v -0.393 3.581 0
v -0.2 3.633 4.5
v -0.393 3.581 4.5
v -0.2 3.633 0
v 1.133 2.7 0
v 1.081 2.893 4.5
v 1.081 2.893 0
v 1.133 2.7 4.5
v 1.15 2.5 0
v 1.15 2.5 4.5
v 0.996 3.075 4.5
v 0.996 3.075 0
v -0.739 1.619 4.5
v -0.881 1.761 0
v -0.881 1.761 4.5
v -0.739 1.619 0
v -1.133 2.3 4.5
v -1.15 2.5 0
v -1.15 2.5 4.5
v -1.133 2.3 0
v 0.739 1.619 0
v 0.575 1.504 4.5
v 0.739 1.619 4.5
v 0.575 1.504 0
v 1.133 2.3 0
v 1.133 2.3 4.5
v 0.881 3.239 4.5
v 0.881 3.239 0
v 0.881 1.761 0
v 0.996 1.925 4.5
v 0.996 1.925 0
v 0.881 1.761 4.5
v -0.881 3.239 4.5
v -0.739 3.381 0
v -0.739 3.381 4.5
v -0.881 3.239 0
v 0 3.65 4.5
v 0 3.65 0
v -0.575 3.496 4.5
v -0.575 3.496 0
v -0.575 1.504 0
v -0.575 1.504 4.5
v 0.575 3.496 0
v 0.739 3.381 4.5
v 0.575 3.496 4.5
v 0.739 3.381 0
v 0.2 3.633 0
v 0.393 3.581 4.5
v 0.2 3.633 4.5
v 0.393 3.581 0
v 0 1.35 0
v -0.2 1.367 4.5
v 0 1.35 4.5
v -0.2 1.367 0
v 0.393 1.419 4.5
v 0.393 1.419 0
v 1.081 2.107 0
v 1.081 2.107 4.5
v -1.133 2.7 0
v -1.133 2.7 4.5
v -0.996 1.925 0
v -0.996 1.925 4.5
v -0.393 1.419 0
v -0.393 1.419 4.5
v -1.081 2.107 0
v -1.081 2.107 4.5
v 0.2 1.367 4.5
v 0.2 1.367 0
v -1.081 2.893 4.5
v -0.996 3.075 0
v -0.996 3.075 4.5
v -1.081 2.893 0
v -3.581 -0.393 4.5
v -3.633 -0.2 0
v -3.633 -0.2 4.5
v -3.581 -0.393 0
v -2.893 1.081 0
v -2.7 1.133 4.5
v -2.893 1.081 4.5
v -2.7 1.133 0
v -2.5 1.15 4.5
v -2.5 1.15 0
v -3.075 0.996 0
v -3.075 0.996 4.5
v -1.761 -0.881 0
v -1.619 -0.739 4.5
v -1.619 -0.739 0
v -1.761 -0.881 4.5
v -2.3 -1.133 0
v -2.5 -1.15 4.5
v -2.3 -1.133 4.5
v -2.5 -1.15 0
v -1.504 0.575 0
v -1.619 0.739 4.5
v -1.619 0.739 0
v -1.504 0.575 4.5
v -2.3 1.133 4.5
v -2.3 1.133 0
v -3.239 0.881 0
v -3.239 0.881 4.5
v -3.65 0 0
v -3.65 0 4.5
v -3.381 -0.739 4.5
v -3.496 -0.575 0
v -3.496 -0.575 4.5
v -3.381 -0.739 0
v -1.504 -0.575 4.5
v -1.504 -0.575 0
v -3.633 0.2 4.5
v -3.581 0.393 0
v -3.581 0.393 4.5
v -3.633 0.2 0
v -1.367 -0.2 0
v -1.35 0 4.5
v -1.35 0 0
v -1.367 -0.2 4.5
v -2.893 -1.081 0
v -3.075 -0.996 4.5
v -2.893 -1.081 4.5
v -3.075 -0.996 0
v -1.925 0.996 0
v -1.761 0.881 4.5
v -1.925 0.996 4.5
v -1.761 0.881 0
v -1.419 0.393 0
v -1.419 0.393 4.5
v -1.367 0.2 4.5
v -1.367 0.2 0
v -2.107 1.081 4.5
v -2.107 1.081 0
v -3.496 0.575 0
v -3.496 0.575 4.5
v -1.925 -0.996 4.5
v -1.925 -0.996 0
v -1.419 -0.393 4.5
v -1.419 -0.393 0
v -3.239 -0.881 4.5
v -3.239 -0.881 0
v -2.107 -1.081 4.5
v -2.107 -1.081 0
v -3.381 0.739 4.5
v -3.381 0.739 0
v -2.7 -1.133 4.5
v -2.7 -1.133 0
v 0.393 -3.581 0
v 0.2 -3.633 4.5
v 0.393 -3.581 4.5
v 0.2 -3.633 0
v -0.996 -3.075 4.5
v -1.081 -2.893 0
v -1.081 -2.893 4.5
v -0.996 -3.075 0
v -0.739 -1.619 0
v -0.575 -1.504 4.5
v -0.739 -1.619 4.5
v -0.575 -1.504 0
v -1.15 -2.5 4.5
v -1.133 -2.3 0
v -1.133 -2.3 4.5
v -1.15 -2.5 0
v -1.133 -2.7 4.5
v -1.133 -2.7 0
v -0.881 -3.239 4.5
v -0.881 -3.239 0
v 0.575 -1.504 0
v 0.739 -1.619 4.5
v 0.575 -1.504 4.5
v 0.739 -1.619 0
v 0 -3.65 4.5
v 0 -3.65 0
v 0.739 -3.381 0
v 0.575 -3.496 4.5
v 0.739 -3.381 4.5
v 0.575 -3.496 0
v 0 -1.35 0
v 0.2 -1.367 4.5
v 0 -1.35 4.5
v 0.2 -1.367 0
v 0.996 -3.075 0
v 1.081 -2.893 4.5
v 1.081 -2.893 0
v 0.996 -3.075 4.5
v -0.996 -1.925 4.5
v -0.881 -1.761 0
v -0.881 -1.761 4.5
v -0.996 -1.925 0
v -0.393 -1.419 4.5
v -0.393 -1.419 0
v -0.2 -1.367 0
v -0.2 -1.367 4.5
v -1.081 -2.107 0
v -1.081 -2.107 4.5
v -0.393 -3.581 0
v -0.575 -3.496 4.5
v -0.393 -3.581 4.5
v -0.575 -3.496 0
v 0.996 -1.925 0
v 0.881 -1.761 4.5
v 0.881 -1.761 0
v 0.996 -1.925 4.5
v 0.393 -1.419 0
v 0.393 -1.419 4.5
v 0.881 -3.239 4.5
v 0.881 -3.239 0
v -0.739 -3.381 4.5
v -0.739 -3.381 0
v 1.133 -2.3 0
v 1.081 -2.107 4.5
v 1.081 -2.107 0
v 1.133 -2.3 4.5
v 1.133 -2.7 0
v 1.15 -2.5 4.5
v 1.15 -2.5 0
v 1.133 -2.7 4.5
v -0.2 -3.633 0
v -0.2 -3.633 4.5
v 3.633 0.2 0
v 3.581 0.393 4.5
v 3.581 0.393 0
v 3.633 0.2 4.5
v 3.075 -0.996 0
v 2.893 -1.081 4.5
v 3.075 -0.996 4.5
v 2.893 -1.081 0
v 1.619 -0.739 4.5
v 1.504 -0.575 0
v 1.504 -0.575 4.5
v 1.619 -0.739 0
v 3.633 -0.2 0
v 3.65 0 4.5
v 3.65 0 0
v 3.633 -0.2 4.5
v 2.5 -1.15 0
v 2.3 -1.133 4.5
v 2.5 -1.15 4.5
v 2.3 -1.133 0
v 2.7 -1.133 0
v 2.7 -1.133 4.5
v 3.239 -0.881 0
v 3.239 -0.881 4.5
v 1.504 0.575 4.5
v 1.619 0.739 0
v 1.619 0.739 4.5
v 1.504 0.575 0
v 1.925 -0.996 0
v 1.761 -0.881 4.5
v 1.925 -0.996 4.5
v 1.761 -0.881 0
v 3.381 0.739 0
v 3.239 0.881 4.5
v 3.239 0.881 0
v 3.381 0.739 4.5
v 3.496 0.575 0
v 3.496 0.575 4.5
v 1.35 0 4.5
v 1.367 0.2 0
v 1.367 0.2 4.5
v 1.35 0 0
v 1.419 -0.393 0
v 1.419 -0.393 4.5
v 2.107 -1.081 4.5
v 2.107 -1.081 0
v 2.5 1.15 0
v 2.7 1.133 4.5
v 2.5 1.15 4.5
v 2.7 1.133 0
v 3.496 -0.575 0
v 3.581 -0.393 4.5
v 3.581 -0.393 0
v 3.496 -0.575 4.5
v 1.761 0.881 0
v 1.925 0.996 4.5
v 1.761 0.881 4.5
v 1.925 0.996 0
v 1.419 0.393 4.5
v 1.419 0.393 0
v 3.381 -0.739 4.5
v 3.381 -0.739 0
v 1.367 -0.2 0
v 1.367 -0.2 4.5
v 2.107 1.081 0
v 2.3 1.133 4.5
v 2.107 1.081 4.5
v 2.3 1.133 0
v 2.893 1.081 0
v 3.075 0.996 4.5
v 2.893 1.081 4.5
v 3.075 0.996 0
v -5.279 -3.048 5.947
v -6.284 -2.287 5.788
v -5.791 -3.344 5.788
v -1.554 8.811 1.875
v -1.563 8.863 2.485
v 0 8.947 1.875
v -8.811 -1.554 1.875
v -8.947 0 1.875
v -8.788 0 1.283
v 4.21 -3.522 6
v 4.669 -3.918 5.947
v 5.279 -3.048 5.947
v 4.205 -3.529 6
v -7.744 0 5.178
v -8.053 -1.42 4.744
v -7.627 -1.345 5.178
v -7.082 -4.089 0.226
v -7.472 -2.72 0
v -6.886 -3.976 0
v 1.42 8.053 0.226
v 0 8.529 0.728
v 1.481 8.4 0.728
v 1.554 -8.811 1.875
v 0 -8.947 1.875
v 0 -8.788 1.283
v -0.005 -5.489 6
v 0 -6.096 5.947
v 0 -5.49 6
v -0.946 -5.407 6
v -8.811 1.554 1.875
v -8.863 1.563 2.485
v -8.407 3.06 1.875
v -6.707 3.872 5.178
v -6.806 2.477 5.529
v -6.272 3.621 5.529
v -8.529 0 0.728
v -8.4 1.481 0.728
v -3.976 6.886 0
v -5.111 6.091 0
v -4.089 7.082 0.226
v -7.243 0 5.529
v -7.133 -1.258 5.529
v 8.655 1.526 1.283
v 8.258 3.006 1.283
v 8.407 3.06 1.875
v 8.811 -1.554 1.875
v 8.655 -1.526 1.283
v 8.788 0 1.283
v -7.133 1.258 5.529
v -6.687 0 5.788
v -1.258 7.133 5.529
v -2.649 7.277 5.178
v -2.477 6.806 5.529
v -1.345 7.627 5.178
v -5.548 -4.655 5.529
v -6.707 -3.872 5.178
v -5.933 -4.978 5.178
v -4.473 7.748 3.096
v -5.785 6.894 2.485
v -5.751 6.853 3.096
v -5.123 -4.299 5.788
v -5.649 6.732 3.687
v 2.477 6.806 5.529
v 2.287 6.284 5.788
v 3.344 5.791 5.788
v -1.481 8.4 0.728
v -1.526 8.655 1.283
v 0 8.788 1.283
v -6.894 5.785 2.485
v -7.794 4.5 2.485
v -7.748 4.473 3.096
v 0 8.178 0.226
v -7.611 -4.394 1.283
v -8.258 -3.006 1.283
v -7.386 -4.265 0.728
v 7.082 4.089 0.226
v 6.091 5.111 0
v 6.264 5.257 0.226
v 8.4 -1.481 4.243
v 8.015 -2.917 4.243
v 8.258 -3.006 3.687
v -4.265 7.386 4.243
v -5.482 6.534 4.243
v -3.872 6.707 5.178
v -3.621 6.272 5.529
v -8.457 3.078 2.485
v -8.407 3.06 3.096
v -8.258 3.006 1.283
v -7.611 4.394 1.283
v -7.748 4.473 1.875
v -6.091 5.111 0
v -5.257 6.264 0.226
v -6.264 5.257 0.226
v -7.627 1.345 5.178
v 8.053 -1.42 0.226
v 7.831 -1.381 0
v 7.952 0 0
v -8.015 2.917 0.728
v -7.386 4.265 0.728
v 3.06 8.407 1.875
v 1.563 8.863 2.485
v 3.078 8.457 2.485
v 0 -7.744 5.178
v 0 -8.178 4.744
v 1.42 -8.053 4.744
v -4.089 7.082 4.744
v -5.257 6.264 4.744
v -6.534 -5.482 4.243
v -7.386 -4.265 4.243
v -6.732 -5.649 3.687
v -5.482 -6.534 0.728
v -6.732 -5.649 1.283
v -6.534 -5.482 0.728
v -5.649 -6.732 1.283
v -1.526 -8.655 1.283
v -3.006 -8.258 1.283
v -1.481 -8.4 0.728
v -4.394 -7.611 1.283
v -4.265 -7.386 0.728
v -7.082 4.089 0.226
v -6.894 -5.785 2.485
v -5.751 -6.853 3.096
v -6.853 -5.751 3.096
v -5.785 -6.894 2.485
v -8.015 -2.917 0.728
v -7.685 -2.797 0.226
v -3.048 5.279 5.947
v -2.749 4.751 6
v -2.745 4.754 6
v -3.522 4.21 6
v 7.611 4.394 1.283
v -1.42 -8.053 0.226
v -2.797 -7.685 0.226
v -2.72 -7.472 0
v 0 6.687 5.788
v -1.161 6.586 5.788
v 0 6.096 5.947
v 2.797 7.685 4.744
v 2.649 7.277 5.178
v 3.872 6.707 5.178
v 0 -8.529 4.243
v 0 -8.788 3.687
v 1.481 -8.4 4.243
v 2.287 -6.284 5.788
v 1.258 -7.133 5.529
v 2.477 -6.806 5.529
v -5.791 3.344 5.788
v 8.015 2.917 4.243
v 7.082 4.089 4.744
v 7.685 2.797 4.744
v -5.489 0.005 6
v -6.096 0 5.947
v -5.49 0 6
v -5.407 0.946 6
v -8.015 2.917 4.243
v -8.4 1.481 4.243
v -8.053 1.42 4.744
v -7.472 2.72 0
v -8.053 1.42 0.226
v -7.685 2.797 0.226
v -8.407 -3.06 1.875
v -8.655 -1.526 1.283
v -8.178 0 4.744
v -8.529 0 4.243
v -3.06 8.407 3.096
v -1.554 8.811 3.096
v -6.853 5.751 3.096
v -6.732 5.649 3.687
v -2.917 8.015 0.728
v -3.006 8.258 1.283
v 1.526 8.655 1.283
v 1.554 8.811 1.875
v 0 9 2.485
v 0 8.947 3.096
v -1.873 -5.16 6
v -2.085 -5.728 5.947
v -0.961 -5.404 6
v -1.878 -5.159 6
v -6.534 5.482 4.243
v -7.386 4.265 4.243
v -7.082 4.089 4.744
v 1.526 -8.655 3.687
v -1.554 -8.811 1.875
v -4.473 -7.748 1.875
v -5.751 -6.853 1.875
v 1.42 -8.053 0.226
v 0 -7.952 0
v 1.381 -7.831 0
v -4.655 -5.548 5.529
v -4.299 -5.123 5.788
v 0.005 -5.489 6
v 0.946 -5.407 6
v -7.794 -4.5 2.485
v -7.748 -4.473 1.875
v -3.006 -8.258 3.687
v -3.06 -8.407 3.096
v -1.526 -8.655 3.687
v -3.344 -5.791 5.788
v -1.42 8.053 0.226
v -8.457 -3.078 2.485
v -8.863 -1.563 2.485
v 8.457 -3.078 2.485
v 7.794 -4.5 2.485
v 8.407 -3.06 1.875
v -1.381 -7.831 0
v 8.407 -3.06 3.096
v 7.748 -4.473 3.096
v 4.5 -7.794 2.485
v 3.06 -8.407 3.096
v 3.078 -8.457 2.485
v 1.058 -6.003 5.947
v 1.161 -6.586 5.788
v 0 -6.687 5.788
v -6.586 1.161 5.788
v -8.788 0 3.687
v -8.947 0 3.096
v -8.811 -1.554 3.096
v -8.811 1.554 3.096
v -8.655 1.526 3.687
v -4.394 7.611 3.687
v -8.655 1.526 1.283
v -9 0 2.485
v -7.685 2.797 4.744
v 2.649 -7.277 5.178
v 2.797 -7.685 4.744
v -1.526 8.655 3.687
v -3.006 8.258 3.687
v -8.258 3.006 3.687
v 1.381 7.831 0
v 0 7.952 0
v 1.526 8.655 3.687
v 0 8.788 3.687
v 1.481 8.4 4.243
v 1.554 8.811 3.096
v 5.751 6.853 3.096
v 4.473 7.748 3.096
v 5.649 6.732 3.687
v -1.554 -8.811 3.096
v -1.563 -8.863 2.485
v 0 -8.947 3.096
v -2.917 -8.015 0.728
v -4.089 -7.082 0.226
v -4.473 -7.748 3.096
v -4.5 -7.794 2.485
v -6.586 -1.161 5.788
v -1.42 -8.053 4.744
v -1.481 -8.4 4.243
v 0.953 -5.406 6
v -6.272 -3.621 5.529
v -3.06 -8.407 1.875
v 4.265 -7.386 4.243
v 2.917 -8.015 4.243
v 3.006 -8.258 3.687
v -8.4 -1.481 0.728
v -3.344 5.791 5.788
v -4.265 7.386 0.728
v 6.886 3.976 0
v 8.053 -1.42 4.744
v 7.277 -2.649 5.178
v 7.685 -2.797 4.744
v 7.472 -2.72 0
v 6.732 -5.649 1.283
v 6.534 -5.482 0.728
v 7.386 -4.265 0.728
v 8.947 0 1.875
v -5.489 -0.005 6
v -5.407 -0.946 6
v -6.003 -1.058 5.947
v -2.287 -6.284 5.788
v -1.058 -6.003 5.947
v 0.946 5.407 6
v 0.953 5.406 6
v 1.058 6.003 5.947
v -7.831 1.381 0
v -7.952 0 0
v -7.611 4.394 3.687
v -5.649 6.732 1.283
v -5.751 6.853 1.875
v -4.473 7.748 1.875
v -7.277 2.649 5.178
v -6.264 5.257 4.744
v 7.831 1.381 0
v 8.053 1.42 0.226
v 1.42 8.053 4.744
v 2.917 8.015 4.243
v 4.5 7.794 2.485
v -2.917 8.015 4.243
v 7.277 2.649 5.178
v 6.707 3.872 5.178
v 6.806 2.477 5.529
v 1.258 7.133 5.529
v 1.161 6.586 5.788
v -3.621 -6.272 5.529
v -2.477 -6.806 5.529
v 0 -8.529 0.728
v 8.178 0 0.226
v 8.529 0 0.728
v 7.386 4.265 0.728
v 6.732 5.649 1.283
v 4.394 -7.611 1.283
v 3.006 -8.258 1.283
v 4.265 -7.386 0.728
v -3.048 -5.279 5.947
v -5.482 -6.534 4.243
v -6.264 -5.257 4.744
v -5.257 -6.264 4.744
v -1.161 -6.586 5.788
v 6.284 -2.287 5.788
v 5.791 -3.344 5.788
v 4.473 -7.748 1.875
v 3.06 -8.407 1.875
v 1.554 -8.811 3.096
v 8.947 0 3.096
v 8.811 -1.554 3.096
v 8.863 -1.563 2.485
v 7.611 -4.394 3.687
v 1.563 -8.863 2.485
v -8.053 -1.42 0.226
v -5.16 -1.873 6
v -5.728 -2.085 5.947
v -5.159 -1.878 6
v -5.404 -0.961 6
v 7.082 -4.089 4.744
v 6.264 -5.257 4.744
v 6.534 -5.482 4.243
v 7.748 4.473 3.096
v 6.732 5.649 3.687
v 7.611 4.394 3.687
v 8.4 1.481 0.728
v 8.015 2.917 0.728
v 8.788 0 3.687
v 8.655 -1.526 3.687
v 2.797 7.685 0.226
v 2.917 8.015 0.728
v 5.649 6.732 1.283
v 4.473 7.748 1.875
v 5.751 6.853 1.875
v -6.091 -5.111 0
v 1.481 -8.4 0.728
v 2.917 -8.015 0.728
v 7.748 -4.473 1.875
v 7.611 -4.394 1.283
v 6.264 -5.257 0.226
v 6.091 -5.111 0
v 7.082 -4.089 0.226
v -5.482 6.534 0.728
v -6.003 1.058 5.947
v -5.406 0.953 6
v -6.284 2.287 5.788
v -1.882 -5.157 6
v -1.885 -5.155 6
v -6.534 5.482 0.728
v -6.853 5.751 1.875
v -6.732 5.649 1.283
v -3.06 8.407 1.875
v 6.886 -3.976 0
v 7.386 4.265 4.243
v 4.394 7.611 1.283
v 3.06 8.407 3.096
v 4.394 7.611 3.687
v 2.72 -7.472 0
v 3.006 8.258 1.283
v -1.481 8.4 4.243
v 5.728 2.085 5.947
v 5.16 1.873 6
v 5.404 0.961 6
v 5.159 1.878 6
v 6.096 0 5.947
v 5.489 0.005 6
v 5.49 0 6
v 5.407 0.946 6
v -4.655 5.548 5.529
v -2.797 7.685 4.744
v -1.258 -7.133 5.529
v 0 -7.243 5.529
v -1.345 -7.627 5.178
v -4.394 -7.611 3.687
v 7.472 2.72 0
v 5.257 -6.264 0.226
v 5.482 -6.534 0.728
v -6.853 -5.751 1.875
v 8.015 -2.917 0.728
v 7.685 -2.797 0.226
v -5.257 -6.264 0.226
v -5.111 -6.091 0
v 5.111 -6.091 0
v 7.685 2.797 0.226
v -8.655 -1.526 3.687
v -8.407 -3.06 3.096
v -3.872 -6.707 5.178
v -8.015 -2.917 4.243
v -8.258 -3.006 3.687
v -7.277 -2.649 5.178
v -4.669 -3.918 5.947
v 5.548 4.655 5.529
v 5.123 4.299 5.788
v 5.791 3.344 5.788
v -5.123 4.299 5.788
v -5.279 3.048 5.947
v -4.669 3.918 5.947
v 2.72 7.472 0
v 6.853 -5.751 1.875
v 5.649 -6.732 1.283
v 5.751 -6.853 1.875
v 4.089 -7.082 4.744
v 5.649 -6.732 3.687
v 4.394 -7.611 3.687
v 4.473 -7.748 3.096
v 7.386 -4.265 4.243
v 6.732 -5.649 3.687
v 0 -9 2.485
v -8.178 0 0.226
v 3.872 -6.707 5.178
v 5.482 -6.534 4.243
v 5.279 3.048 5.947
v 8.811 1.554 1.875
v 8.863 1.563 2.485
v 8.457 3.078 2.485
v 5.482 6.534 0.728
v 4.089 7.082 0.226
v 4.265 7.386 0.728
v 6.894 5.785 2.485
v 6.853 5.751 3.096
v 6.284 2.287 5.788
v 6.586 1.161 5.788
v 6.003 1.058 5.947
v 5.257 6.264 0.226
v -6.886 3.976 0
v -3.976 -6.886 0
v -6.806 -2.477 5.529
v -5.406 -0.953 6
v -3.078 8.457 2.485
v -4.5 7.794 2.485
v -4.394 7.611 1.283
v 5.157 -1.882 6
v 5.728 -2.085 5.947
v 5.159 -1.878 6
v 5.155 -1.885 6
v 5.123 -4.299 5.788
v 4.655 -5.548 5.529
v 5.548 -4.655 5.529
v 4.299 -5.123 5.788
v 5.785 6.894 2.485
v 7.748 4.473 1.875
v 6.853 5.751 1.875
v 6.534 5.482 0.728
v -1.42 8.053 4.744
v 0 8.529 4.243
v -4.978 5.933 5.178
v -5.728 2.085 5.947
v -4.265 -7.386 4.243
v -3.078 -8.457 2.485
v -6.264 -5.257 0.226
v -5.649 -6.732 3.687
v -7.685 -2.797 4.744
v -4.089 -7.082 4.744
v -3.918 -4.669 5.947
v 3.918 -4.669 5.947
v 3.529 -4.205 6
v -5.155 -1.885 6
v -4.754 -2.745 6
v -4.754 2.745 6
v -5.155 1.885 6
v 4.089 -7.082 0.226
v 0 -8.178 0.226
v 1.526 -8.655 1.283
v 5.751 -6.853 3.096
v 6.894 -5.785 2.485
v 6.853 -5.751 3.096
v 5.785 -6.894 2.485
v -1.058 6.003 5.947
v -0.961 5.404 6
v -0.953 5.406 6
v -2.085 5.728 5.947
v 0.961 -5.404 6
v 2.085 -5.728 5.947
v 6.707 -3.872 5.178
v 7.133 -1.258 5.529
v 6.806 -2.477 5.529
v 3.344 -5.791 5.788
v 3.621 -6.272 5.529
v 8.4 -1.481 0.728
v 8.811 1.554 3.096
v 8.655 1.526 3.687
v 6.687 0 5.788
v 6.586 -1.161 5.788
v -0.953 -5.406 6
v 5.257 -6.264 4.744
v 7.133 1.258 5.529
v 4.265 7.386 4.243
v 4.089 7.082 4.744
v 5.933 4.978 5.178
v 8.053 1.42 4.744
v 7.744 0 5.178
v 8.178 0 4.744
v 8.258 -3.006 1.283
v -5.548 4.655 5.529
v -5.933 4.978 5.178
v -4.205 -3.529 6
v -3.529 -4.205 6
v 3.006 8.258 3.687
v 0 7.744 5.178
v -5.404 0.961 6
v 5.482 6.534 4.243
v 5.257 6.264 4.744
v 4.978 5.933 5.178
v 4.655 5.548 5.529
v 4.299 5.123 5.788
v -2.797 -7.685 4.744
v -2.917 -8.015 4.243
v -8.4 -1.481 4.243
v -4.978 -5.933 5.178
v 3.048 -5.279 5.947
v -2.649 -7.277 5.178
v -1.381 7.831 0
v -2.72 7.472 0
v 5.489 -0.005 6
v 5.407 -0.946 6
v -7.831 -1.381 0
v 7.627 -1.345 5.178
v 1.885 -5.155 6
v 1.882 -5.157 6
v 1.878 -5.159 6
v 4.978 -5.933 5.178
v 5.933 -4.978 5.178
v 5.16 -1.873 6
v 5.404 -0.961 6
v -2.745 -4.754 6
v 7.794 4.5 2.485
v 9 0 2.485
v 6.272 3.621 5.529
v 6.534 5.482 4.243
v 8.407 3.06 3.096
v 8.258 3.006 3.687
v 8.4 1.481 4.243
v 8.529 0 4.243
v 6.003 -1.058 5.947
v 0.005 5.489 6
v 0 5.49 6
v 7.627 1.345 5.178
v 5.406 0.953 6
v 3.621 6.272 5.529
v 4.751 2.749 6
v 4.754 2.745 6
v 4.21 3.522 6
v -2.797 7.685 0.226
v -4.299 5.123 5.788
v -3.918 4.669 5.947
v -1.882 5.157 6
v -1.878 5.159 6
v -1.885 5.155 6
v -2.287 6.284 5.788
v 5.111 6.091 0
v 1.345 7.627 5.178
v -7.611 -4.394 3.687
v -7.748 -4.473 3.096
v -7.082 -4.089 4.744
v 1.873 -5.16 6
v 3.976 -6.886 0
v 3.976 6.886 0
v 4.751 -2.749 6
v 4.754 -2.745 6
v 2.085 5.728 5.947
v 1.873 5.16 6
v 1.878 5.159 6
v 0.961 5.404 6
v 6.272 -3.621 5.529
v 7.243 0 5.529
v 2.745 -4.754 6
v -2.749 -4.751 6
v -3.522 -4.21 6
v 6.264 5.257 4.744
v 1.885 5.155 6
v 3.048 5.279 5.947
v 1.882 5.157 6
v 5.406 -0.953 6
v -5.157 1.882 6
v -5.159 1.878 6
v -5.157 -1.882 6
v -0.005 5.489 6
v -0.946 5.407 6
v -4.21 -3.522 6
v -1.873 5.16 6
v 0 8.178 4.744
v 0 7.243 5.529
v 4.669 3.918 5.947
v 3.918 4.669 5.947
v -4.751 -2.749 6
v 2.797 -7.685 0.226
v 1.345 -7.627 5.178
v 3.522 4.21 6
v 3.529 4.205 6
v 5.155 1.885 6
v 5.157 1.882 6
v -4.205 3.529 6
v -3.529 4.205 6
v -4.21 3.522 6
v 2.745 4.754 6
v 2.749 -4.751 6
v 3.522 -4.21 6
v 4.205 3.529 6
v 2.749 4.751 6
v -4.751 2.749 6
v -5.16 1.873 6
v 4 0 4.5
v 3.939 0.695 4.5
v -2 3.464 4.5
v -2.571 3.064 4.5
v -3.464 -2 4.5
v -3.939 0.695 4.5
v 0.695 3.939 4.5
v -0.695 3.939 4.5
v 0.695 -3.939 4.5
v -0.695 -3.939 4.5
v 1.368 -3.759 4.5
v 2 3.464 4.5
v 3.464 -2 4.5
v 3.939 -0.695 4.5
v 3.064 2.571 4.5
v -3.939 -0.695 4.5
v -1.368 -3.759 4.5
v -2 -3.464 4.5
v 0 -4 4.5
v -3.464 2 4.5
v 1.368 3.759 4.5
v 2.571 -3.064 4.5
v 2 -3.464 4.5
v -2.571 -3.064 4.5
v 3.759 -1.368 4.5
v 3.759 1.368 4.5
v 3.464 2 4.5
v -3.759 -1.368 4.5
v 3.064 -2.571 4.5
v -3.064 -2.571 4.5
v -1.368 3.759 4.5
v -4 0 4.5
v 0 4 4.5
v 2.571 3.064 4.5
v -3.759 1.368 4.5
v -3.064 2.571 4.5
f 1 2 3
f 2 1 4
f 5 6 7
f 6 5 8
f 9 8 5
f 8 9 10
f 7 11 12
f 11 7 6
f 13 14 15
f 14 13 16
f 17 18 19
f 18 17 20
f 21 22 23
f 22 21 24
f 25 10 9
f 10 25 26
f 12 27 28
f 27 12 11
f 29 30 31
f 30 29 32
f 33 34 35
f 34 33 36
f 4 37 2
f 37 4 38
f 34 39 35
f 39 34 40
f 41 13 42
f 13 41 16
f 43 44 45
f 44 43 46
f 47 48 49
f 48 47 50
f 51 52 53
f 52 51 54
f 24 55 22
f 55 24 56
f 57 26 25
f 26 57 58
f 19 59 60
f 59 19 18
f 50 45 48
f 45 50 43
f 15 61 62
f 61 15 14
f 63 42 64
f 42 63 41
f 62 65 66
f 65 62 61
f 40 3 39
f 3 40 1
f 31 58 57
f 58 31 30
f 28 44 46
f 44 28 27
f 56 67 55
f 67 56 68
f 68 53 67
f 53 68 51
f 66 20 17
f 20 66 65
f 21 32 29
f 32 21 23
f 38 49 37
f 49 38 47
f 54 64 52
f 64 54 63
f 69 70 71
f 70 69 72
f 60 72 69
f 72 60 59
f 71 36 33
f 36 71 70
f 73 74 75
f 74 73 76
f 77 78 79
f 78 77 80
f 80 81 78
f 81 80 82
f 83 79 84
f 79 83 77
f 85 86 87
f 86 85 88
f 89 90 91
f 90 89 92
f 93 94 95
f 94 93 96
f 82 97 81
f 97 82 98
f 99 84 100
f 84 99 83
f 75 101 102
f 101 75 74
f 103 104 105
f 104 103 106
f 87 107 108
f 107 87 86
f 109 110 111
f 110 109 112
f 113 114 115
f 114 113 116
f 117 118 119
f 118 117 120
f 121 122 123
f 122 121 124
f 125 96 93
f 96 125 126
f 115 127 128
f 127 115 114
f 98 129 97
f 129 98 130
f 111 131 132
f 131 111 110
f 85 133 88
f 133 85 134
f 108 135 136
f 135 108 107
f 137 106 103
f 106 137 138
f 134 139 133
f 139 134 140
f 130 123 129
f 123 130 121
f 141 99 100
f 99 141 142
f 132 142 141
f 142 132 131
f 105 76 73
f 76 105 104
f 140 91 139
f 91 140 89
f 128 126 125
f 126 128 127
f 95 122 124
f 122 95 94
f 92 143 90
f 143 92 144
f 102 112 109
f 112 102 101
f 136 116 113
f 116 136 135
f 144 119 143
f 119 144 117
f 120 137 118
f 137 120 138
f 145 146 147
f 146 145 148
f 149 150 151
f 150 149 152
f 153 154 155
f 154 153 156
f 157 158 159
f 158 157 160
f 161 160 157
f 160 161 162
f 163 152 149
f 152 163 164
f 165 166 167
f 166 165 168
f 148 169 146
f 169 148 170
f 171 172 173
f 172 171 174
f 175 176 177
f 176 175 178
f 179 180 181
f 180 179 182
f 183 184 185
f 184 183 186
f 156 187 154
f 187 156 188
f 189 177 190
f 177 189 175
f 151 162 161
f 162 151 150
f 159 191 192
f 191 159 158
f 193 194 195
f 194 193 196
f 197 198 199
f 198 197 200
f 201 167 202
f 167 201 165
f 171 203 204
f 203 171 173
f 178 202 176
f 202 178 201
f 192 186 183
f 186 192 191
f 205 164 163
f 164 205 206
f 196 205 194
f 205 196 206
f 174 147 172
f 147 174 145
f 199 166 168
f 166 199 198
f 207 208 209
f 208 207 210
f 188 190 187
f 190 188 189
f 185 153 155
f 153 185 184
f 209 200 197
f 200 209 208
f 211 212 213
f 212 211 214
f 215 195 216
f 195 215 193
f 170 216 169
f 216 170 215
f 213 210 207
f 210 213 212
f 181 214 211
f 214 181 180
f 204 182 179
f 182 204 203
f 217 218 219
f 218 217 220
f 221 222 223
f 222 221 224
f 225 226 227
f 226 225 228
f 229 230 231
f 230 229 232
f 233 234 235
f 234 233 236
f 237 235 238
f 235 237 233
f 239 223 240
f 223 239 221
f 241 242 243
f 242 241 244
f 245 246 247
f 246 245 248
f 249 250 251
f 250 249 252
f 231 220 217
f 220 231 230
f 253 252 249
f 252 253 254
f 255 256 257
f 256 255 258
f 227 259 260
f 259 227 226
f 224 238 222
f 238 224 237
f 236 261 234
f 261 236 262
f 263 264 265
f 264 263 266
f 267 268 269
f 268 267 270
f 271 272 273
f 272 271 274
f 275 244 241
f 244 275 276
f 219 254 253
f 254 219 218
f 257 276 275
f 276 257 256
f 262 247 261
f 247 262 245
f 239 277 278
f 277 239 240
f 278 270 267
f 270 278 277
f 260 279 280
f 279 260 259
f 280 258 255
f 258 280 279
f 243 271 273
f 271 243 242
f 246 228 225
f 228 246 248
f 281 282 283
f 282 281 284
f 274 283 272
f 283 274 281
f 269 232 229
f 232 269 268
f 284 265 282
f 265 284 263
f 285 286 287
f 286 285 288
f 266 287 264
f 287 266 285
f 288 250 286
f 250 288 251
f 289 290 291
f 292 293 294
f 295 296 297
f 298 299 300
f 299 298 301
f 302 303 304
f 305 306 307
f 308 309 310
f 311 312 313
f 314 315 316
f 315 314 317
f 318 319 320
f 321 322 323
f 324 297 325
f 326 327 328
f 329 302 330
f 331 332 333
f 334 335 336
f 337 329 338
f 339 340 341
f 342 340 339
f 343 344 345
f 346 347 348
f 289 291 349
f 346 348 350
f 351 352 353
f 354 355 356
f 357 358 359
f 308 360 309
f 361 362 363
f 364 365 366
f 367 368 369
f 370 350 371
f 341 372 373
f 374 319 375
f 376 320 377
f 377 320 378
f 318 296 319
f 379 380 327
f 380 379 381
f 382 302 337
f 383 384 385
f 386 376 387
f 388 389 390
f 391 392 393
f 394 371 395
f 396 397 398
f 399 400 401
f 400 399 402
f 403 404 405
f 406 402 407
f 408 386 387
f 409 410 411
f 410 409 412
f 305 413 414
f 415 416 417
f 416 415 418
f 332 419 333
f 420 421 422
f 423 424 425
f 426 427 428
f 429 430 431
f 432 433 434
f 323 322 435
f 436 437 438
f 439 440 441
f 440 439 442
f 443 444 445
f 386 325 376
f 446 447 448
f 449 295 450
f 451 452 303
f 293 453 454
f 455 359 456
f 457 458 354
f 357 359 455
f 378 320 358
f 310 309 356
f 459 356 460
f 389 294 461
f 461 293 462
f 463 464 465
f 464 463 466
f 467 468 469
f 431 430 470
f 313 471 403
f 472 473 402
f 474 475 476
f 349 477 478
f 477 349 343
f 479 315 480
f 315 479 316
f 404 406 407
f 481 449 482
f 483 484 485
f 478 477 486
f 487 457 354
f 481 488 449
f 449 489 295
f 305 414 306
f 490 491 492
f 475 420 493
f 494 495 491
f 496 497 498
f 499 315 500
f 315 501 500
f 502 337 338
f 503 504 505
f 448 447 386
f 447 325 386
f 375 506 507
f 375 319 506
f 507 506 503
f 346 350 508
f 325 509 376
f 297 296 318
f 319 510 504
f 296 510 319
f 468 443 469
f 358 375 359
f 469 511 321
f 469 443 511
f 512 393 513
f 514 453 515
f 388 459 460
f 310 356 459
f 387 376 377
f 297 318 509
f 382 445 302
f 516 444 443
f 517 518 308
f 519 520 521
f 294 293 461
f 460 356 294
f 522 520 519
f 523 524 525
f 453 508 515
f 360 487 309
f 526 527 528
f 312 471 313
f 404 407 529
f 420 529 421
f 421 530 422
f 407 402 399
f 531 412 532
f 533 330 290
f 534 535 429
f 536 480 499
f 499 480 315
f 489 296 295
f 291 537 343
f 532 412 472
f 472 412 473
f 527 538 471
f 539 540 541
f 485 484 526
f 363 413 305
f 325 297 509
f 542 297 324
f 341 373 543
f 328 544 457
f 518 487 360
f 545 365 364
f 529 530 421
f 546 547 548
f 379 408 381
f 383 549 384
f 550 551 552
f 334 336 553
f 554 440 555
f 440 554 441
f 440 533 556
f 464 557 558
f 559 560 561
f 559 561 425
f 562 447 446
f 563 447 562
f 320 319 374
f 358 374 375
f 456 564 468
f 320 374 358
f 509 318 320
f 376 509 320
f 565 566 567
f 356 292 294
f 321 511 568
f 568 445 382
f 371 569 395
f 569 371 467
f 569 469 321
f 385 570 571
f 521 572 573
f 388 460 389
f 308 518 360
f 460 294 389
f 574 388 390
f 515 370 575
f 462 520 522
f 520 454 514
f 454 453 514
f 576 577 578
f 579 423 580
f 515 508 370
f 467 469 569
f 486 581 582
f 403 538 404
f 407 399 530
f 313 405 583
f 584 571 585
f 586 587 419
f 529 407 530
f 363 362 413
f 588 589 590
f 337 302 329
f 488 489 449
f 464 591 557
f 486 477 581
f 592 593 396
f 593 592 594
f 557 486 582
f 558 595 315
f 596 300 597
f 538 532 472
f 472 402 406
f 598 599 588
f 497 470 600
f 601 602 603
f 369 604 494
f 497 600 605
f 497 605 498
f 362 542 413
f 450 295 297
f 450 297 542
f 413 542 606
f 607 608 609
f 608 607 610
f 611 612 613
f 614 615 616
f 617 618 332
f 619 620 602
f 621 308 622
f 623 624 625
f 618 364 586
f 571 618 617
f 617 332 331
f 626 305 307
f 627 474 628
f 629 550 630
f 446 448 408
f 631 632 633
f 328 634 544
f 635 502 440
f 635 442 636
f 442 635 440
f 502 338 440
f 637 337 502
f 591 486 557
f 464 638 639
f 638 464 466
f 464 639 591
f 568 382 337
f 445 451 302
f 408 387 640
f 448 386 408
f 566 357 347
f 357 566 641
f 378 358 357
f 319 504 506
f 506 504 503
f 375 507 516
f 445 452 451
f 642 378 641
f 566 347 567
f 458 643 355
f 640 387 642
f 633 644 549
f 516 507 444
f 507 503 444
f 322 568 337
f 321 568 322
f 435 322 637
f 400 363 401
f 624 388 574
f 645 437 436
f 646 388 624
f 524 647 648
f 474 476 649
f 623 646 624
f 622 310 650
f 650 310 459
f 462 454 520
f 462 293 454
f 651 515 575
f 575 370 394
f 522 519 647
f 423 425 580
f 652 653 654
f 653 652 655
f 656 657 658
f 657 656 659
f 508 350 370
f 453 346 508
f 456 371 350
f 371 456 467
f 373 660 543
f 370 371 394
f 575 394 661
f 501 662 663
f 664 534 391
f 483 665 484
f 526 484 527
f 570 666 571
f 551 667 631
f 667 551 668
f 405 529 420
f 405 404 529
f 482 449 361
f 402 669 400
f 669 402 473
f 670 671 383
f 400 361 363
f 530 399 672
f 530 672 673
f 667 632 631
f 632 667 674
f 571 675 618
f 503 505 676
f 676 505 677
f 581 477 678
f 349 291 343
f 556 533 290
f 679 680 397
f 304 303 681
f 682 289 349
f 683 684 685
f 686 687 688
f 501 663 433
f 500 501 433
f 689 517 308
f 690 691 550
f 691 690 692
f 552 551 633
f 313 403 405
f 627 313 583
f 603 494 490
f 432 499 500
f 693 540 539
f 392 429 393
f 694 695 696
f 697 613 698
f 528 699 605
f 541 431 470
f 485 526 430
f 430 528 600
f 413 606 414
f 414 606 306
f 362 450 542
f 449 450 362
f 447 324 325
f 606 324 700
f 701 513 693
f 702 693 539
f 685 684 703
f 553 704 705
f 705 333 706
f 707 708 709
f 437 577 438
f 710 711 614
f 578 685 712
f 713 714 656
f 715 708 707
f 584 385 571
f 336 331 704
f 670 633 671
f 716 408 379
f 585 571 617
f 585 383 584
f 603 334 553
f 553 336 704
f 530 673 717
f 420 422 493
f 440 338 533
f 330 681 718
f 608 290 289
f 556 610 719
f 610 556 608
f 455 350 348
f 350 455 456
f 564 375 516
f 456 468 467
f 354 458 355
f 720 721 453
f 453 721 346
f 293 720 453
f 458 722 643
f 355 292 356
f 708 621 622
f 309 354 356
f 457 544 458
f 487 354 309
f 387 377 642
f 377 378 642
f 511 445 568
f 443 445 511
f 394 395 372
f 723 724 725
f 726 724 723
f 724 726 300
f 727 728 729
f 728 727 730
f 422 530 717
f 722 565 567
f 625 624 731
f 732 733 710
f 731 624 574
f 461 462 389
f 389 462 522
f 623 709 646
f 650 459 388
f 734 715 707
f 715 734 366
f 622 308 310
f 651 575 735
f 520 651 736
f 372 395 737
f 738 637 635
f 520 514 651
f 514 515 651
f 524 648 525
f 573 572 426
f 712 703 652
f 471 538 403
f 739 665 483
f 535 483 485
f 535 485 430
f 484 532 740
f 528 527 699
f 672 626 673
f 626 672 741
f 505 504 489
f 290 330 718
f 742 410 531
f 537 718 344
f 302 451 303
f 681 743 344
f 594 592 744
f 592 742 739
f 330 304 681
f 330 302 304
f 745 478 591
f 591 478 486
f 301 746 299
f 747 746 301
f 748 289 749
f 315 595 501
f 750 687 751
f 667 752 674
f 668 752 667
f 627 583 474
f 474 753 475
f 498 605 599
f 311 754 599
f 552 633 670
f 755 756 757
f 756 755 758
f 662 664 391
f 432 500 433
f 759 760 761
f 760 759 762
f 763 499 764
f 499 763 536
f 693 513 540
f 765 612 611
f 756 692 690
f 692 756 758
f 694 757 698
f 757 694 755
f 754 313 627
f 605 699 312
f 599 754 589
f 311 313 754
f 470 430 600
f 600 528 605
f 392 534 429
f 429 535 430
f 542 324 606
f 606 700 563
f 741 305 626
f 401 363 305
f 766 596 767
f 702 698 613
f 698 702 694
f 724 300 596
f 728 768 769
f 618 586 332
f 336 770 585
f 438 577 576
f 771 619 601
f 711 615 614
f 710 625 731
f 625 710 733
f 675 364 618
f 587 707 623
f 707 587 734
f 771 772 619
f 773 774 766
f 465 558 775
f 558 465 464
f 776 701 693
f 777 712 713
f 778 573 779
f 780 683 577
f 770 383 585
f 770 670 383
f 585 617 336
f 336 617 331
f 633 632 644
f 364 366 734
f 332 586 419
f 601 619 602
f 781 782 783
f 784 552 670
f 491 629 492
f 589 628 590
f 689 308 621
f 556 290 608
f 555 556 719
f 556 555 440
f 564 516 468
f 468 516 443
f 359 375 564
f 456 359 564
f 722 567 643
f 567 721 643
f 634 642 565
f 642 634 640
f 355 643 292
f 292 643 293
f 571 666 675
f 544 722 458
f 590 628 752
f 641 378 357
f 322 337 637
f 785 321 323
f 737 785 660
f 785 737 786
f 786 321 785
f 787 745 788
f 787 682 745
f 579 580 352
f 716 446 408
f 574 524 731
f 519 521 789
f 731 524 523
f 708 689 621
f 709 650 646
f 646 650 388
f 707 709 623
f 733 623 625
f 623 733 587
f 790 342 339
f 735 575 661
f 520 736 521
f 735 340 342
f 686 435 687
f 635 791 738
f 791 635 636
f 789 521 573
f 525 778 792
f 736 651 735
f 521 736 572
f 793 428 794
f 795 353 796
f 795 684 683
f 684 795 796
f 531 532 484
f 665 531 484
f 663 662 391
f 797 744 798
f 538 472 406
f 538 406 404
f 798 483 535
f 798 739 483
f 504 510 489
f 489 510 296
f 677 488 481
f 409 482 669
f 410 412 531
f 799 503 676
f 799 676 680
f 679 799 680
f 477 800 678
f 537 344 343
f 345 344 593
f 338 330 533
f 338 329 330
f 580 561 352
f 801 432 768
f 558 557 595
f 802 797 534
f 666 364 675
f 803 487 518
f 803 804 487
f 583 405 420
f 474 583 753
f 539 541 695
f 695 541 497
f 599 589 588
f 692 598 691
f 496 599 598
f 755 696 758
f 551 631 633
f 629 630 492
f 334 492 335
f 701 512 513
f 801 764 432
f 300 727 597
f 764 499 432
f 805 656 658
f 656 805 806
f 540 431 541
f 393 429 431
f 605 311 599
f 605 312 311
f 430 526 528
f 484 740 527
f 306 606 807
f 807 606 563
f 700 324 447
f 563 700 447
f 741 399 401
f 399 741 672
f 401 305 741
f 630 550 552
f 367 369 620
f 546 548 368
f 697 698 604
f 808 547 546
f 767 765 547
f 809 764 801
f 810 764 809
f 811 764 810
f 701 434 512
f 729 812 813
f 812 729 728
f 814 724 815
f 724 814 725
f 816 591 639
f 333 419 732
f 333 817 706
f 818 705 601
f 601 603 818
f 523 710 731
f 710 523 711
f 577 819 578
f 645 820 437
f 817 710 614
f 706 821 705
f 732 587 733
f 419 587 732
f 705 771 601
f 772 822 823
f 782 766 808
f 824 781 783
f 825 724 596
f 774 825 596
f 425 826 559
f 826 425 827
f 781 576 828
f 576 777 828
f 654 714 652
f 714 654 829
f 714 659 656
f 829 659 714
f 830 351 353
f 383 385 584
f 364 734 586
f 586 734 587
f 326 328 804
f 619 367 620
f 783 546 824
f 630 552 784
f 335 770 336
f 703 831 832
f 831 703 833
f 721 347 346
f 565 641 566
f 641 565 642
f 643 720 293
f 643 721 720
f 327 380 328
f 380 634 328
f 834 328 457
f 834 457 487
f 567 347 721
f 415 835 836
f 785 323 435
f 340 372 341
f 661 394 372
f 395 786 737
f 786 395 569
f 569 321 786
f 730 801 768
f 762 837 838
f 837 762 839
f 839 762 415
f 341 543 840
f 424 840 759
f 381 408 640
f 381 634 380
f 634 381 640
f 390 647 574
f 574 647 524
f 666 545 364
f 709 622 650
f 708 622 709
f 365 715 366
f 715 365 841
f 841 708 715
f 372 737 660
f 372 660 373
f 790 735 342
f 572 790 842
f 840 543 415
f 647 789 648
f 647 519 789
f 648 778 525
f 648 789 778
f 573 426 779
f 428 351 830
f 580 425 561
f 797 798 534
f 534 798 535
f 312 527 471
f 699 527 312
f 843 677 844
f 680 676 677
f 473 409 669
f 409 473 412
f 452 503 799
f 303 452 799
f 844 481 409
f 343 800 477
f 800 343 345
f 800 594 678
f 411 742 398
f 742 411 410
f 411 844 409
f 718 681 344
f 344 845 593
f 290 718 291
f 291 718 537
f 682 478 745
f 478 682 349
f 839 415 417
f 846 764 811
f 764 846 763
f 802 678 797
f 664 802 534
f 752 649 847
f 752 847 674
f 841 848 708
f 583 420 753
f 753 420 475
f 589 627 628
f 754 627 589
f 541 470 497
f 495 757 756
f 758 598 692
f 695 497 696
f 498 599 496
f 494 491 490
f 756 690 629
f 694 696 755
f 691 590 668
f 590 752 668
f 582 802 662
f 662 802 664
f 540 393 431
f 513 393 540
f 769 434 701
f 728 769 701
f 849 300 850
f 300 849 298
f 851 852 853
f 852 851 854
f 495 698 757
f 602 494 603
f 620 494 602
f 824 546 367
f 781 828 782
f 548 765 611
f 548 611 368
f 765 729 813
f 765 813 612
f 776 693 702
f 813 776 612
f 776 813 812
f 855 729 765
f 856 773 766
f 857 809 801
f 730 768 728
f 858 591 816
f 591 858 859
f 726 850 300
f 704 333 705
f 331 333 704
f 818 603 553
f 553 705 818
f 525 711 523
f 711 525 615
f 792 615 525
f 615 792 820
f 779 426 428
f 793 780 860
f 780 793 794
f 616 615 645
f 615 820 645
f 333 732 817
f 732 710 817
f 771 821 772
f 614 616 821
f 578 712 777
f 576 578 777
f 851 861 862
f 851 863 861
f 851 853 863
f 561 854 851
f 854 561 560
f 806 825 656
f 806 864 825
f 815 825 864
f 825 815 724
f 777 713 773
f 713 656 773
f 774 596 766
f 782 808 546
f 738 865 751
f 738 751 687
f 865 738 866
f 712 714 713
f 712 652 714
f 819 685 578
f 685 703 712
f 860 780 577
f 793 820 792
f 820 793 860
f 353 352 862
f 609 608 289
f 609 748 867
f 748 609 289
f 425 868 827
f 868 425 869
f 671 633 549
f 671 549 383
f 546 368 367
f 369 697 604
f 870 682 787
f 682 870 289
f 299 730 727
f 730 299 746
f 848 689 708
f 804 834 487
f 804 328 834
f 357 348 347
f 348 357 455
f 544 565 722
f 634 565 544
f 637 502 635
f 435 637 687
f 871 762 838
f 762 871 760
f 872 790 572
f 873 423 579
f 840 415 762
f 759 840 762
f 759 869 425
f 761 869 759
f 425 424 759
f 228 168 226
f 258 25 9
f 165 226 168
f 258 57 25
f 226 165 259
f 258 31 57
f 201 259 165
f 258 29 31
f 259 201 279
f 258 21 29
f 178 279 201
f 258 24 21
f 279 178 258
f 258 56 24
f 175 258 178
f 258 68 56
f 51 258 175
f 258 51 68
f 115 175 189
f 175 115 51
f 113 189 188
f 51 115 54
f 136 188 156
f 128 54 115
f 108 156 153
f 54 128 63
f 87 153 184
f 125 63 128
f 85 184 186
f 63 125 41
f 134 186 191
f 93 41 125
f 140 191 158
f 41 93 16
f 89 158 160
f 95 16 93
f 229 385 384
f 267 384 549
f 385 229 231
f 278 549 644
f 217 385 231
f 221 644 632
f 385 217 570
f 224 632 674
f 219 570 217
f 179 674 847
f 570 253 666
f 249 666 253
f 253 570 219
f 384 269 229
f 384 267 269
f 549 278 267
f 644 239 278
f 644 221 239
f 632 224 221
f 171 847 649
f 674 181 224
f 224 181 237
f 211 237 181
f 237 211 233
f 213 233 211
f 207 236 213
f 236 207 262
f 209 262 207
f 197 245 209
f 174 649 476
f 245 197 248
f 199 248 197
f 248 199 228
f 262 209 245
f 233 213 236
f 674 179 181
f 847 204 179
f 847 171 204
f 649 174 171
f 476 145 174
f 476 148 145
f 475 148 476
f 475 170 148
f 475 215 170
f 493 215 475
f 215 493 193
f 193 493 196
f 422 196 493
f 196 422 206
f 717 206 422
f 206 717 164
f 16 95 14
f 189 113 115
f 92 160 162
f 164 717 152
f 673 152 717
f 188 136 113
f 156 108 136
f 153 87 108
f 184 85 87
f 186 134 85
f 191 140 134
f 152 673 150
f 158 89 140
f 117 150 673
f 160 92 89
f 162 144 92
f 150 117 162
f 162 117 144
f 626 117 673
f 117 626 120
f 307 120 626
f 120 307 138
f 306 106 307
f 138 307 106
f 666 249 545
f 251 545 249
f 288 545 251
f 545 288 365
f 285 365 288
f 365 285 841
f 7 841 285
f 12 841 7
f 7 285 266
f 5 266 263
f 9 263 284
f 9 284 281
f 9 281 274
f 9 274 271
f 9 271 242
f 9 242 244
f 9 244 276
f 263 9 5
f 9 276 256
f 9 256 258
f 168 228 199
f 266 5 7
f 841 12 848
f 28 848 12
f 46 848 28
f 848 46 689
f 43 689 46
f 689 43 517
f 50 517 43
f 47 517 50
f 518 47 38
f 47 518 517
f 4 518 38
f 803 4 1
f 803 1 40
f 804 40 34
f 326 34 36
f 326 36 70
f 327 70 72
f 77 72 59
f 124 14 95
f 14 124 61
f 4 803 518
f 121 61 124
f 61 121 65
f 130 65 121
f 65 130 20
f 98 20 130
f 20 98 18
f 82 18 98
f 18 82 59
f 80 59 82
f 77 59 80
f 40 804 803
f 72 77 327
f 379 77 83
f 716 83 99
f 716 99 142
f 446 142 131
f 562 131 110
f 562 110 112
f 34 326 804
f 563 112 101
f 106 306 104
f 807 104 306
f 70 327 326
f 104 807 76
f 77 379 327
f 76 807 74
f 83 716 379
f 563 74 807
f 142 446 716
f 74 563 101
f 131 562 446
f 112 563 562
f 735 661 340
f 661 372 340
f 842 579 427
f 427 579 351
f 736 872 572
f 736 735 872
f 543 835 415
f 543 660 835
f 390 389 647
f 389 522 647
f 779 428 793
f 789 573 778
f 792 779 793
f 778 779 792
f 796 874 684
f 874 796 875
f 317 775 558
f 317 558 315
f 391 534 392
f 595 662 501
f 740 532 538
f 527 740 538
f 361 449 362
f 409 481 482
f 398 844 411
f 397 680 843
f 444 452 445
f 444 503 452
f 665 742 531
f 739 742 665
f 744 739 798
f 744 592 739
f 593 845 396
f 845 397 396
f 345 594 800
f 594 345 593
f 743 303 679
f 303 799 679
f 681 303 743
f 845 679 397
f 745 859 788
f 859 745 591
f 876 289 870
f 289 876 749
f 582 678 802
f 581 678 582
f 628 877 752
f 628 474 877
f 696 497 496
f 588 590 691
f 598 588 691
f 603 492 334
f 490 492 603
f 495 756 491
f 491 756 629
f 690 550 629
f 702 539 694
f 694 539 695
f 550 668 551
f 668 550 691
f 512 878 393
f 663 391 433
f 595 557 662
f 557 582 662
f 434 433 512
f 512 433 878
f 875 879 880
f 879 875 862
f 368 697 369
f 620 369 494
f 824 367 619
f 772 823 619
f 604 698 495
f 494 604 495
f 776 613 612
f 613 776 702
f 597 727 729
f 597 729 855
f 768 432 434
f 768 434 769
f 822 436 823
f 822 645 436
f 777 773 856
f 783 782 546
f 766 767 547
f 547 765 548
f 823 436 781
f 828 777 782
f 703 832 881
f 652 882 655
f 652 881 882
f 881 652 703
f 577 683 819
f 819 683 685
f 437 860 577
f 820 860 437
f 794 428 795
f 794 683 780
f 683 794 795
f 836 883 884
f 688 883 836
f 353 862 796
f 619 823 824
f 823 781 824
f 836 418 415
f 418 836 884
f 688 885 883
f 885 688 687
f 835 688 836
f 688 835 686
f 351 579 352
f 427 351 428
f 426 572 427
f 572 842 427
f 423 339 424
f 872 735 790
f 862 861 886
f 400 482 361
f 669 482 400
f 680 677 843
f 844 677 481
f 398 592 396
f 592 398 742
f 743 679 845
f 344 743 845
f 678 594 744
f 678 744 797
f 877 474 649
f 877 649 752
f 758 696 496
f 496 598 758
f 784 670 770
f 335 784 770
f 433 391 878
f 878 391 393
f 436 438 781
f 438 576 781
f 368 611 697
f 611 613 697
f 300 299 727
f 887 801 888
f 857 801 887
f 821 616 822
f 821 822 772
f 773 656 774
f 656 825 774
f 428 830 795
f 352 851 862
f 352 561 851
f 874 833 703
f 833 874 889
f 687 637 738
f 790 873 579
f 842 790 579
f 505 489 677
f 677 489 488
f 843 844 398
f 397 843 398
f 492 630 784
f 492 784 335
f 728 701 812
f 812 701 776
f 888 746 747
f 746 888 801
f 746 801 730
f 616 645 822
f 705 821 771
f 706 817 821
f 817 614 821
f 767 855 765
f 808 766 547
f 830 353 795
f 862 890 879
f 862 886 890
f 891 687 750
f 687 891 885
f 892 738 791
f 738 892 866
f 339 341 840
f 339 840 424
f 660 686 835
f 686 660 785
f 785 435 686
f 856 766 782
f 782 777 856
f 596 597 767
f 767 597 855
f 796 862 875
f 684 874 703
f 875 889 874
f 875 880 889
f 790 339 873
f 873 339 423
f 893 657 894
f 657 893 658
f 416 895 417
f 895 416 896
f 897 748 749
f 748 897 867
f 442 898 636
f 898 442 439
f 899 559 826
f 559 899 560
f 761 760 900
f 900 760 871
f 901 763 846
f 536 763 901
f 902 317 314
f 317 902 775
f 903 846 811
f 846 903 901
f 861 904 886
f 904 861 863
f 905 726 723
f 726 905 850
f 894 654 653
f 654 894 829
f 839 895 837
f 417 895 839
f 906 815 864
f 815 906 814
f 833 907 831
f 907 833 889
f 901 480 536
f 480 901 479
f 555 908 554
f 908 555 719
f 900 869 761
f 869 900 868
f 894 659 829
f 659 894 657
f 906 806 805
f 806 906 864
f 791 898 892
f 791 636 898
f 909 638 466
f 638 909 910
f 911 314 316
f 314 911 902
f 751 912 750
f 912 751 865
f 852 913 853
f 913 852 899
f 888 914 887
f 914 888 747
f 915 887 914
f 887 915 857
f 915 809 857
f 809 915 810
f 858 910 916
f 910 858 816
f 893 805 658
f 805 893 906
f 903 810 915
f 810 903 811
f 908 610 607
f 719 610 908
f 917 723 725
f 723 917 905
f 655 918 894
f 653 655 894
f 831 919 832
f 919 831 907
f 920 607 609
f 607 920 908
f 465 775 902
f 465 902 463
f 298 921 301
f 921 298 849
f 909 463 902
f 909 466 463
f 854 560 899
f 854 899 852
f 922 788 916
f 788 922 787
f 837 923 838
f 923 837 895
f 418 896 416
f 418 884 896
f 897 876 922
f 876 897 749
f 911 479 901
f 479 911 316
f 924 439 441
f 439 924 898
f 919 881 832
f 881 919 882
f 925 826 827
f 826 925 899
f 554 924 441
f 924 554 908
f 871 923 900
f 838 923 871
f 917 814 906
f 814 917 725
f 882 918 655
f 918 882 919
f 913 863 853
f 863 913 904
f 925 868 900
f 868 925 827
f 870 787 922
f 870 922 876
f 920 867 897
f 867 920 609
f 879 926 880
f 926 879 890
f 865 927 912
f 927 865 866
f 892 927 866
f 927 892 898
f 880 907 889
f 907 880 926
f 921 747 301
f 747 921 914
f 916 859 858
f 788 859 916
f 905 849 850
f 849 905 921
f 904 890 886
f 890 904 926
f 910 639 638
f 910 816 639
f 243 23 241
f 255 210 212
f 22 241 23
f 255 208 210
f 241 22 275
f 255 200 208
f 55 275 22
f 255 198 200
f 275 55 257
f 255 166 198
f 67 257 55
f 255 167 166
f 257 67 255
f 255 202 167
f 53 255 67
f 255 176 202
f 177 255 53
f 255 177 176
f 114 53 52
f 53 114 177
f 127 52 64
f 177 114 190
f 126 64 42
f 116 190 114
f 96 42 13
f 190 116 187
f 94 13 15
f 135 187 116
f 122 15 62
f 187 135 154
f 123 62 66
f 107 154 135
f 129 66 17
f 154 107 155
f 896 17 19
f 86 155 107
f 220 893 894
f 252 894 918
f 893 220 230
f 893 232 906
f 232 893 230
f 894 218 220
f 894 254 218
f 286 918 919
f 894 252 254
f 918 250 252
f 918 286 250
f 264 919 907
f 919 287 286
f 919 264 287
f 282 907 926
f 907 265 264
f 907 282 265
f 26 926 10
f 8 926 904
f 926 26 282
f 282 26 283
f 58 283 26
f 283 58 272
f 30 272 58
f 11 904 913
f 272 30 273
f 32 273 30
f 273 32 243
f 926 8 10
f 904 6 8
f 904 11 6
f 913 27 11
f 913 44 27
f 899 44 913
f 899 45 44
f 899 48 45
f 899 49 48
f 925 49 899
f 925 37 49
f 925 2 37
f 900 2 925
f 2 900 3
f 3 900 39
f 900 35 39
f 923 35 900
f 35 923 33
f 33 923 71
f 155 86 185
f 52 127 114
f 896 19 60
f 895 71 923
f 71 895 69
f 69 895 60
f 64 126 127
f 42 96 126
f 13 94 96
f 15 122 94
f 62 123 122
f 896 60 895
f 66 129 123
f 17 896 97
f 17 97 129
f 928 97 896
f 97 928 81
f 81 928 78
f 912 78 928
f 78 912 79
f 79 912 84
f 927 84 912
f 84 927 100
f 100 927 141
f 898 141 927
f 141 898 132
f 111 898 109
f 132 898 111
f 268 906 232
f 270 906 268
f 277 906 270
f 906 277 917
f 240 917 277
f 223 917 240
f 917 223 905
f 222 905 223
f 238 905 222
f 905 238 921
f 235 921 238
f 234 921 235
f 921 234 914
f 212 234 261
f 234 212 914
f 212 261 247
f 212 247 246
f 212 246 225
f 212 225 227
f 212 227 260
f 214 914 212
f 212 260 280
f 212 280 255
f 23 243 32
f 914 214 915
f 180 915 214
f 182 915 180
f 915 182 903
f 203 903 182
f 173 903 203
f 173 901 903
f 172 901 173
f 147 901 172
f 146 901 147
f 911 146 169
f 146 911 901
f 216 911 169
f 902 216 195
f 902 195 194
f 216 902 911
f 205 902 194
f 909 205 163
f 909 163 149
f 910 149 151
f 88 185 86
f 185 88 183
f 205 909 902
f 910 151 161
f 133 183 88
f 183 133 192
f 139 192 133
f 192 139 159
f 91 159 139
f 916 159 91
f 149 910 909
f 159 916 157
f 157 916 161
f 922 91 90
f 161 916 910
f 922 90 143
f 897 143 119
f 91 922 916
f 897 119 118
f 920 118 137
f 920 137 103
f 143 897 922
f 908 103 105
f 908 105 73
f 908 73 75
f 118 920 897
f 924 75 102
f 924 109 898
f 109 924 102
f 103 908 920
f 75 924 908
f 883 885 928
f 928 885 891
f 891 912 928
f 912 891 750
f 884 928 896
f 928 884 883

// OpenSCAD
thickness = 6;
majorDiameter = 18;
holeDiameter = 2.3;
holeSpacing = 5;
depressionDepth = 1.5;
depressionDiameter = 8;

module dummy() {}

rounding = thickness / (1+sqrt(0.5));
$fn = 36;
dy = rounding * (1-sqrt(0.5));
nudge = 0.01;

difference() {
    rotate_extrude() 
    {
        square([majorDiameter/2-rounding,2*rounding-dy]);
        translate([majorDiameter/2-rounding,0])
        render(convexity=1)
        intersection() {
            translate([-rounding,0]) square([rounding*2,rounding*2]);
            translate([0,rounding-dy])
            circle(r=rounding);
        }
    }
    union() {
        for (angle=[0:90:270])
            rotate([0,0,angle])
                translate([0,holeSpacing/2,-nudge]) cylinder(d=holeDiameter,h=2*rounding+2*nudge);
    }
    translate([0,0,2*rounding-dy-depressionDepth])
    cylinder(d1=depressionDiameter,d2=depressionDiameter+2*depressionDepth,h=depressionDepth+nudge);
}
